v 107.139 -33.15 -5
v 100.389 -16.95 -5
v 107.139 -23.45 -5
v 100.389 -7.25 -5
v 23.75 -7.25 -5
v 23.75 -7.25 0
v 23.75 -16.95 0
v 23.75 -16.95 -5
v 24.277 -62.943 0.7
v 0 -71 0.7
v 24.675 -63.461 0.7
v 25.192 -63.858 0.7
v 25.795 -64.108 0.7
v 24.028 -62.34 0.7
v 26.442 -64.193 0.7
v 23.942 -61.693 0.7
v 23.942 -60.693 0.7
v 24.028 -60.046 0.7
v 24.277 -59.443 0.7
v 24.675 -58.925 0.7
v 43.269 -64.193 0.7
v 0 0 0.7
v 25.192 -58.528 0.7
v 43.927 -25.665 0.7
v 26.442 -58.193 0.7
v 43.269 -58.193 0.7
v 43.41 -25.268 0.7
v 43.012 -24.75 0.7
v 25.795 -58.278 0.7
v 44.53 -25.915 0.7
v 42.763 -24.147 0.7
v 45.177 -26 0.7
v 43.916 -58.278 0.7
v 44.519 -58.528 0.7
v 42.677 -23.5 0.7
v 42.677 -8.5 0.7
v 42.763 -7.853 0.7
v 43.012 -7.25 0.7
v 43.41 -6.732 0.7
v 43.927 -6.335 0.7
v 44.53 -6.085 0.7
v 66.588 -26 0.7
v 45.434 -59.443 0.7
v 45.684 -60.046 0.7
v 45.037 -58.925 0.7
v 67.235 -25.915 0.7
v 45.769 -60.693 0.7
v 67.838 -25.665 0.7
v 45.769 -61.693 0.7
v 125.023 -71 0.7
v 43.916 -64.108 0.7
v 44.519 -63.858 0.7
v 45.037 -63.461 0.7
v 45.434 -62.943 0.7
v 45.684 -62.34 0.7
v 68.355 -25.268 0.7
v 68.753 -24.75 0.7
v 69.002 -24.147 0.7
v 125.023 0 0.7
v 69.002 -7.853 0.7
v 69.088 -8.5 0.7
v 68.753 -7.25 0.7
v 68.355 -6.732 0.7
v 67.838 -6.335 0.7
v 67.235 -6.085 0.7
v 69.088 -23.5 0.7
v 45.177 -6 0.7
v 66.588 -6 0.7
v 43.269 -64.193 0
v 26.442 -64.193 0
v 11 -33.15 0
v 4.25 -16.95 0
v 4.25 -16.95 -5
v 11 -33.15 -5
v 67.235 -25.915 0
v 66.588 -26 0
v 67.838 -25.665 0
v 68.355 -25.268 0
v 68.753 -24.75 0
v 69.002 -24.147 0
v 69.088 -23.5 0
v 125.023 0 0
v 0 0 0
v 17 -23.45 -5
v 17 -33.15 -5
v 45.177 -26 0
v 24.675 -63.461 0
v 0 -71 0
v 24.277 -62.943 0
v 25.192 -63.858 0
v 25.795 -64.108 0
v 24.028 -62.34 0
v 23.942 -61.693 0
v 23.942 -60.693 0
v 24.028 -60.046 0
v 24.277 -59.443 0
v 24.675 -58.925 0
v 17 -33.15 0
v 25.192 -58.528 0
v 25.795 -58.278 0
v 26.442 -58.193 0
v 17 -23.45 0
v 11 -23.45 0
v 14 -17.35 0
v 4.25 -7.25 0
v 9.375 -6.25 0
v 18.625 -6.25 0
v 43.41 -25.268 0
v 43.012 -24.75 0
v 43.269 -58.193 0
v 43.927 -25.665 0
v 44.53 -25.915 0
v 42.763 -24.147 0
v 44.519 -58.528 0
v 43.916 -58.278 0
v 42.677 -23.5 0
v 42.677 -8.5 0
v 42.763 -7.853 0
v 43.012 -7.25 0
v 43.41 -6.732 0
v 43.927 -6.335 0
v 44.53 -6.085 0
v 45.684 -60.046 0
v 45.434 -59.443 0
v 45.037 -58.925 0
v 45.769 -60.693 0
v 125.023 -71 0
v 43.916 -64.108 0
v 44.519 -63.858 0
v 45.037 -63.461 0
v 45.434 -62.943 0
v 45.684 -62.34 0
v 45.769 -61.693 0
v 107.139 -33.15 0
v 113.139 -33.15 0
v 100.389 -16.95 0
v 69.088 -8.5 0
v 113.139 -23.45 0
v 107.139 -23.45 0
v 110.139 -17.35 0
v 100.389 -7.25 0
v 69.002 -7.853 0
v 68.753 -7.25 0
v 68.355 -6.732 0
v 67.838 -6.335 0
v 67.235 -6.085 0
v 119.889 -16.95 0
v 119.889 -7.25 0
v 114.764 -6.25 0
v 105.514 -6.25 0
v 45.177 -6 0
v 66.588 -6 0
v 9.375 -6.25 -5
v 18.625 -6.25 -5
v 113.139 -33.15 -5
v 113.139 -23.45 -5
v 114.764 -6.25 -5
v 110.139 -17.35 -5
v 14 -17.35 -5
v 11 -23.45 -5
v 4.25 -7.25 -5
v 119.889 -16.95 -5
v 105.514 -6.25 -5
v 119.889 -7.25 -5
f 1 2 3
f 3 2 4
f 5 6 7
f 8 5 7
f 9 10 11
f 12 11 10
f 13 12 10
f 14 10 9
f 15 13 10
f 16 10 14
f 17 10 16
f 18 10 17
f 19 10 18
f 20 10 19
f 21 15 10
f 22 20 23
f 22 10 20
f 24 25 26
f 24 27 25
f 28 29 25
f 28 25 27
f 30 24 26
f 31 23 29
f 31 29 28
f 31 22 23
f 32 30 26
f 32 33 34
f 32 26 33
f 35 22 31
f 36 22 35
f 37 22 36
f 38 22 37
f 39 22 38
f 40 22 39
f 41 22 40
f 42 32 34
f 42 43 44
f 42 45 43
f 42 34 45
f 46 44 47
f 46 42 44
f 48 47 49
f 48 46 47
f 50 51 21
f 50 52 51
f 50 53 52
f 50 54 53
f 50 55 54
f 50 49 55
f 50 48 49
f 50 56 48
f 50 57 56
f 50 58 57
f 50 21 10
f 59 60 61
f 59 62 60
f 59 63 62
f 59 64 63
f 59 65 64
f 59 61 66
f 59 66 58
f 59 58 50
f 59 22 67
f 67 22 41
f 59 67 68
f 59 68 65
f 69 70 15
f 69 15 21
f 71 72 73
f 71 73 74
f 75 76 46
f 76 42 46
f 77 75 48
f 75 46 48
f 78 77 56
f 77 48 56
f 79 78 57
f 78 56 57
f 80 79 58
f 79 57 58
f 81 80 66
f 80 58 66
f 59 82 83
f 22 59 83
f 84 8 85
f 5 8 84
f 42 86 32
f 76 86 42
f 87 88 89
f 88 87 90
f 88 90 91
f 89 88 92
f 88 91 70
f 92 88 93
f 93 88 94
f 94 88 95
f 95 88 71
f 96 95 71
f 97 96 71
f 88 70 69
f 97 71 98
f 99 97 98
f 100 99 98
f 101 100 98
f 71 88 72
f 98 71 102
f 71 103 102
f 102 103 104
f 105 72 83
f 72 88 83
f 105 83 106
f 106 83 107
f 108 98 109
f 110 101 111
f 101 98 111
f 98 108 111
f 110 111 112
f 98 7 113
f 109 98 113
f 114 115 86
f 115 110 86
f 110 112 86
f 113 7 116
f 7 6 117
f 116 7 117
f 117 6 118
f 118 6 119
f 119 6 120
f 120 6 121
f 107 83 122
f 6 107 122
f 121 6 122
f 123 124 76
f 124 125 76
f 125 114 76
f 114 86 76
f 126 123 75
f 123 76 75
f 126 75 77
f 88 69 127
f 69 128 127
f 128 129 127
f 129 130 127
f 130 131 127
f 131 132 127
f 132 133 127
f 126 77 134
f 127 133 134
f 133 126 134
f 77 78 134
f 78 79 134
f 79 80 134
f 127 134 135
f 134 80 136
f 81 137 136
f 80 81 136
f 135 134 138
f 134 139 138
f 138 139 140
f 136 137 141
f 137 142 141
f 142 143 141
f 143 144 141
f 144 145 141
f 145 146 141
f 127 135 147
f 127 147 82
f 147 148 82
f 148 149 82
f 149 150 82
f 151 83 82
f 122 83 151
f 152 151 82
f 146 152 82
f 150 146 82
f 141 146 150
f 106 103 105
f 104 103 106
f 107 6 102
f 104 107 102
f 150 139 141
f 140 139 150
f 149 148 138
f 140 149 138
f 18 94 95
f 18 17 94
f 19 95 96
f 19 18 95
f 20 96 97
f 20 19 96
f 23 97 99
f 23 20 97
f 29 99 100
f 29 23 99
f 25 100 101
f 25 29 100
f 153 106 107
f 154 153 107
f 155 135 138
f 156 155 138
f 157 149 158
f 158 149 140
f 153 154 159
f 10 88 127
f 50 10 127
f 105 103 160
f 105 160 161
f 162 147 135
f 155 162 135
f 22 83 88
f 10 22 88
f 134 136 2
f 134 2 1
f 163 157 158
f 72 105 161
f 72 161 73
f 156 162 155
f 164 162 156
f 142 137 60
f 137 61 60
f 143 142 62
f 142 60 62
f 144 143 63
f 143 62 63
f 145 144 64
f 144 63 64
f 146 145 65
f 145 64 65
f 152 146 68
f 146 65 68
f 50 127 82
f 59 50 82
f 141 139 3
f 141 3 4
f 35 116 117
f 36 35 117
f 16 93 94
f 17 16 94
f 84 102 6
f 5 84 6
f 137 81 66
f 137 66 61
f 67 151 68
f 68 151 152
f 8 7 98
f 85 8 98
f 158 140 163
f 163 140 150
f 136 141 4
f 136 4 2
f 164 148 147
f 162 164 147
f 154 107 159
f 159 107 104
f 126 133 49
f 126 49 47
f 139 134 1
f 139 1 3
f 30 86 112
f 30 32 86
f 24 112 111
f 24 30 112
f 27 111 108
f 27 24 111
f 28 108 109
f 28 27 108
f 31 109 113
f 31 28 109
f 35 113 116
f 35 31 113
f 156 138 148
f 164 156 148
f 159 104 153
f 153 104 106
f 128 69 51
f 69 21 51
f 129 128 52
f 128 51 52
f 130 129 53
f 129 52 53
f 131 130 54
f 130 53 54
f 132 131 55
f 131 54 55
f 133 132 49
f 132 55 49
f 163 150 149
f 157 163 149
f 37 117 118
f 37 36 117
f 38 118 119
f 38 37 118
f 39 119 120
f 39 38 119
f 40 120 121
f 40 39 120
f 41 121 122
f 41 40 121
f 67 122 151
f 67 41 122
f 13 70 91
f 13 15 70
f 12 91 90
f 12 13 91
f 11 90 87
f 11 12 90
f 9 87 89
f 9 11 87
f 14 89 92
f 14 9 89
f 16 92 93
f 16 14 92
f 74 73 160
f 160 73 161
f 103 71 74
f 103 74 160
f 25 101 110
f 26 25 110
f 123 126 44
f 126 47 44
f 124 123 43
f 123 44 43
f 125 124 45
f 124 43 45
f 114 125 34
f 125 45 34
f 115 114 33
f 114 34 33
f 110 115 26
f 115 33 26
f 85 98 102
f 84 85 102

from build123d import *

# Parameters (mm, degrees)
SKETCH2_W           = 21.826709
SKETCH2_H           = 6
SKETCH2_W_2         = 26.410128
SKETCH2_H_2         = 20
BOSS_EXTRUDE5_DEPTH = 0.7
BOSS_EXTRUDE6_DEPTH = 5
FILLET1_R           = 2.5


with BuildPart() as part:
    # Sketch2 → Boss-Extrude5 (new body)
    with BuildSketch(Plane.XY):
        Polygon((0, 0), (0, -71), (16.75, -71), (125.022768, -71), (125.022768, 0), align=None)
        with Locations((34.8557935, -61.193169)):
            Rectangle(SKETCH2_W, SKETCH2_H, mode=Mode.SUBTRACT)
        with Locations((55.882521, -16)):
            Rectangle(SKETCH2_W_2, SKETCH2_H_2, mode=Mode.SUBTRACT)
    extrude(amount=BOSS_EXTRUDE5_DEPTH)

    # Sketch2<9> → Boss-Extrude6 (add)
    with BuildSketch(Plane.XY):
        Polygon((113.138624, -23.45), (113.138624, -33.15), (119.888624, -16.95), (119.888624, -7.25), align=None)
        Polygon((100.388624, -7.25), (100.388624, -16.95), (107.138624, -33.15), (107.138624, -23.45), align=None)
        Polygon((114.763624, -6.25), (105.513624, -6.25), (110.138624, -17.35), align=None)
        Polygon((18.625, -6.25), (9.375, -6.25), (14, -17.35), align=None)
        Polygon((11, -23.45), (4.25, -7.25), (4.25, -16.95), (11, -33.15), align=None)
        Polygon((23.75, -16.95), (23.75, -7.25), (17, -23.45), (17, -33.15), align=None)
    extrude(amount=-BOSS_EXTRUDE6_DEPTH)

    # Fillet1
    fillet1_edges = [part.edges().sort_by_distance(p)[0] for p in [
        (23.942439, -64.193169, 0.35),
        (45.769148, -64.193169, 0.35),
        (45.769148, -58.193169, 0.35),
        (23.942439, -58.193169, 0.35),
        (42.677457, -6, 0.35),
        (69.087585, -6, 0.35),
        (42.677457, -26, 0.35),
        (69.087585, -26, 0.35),
    ]]
    fillet(fillet1_edges, radius=FILLET1_R)


solid = part.part
